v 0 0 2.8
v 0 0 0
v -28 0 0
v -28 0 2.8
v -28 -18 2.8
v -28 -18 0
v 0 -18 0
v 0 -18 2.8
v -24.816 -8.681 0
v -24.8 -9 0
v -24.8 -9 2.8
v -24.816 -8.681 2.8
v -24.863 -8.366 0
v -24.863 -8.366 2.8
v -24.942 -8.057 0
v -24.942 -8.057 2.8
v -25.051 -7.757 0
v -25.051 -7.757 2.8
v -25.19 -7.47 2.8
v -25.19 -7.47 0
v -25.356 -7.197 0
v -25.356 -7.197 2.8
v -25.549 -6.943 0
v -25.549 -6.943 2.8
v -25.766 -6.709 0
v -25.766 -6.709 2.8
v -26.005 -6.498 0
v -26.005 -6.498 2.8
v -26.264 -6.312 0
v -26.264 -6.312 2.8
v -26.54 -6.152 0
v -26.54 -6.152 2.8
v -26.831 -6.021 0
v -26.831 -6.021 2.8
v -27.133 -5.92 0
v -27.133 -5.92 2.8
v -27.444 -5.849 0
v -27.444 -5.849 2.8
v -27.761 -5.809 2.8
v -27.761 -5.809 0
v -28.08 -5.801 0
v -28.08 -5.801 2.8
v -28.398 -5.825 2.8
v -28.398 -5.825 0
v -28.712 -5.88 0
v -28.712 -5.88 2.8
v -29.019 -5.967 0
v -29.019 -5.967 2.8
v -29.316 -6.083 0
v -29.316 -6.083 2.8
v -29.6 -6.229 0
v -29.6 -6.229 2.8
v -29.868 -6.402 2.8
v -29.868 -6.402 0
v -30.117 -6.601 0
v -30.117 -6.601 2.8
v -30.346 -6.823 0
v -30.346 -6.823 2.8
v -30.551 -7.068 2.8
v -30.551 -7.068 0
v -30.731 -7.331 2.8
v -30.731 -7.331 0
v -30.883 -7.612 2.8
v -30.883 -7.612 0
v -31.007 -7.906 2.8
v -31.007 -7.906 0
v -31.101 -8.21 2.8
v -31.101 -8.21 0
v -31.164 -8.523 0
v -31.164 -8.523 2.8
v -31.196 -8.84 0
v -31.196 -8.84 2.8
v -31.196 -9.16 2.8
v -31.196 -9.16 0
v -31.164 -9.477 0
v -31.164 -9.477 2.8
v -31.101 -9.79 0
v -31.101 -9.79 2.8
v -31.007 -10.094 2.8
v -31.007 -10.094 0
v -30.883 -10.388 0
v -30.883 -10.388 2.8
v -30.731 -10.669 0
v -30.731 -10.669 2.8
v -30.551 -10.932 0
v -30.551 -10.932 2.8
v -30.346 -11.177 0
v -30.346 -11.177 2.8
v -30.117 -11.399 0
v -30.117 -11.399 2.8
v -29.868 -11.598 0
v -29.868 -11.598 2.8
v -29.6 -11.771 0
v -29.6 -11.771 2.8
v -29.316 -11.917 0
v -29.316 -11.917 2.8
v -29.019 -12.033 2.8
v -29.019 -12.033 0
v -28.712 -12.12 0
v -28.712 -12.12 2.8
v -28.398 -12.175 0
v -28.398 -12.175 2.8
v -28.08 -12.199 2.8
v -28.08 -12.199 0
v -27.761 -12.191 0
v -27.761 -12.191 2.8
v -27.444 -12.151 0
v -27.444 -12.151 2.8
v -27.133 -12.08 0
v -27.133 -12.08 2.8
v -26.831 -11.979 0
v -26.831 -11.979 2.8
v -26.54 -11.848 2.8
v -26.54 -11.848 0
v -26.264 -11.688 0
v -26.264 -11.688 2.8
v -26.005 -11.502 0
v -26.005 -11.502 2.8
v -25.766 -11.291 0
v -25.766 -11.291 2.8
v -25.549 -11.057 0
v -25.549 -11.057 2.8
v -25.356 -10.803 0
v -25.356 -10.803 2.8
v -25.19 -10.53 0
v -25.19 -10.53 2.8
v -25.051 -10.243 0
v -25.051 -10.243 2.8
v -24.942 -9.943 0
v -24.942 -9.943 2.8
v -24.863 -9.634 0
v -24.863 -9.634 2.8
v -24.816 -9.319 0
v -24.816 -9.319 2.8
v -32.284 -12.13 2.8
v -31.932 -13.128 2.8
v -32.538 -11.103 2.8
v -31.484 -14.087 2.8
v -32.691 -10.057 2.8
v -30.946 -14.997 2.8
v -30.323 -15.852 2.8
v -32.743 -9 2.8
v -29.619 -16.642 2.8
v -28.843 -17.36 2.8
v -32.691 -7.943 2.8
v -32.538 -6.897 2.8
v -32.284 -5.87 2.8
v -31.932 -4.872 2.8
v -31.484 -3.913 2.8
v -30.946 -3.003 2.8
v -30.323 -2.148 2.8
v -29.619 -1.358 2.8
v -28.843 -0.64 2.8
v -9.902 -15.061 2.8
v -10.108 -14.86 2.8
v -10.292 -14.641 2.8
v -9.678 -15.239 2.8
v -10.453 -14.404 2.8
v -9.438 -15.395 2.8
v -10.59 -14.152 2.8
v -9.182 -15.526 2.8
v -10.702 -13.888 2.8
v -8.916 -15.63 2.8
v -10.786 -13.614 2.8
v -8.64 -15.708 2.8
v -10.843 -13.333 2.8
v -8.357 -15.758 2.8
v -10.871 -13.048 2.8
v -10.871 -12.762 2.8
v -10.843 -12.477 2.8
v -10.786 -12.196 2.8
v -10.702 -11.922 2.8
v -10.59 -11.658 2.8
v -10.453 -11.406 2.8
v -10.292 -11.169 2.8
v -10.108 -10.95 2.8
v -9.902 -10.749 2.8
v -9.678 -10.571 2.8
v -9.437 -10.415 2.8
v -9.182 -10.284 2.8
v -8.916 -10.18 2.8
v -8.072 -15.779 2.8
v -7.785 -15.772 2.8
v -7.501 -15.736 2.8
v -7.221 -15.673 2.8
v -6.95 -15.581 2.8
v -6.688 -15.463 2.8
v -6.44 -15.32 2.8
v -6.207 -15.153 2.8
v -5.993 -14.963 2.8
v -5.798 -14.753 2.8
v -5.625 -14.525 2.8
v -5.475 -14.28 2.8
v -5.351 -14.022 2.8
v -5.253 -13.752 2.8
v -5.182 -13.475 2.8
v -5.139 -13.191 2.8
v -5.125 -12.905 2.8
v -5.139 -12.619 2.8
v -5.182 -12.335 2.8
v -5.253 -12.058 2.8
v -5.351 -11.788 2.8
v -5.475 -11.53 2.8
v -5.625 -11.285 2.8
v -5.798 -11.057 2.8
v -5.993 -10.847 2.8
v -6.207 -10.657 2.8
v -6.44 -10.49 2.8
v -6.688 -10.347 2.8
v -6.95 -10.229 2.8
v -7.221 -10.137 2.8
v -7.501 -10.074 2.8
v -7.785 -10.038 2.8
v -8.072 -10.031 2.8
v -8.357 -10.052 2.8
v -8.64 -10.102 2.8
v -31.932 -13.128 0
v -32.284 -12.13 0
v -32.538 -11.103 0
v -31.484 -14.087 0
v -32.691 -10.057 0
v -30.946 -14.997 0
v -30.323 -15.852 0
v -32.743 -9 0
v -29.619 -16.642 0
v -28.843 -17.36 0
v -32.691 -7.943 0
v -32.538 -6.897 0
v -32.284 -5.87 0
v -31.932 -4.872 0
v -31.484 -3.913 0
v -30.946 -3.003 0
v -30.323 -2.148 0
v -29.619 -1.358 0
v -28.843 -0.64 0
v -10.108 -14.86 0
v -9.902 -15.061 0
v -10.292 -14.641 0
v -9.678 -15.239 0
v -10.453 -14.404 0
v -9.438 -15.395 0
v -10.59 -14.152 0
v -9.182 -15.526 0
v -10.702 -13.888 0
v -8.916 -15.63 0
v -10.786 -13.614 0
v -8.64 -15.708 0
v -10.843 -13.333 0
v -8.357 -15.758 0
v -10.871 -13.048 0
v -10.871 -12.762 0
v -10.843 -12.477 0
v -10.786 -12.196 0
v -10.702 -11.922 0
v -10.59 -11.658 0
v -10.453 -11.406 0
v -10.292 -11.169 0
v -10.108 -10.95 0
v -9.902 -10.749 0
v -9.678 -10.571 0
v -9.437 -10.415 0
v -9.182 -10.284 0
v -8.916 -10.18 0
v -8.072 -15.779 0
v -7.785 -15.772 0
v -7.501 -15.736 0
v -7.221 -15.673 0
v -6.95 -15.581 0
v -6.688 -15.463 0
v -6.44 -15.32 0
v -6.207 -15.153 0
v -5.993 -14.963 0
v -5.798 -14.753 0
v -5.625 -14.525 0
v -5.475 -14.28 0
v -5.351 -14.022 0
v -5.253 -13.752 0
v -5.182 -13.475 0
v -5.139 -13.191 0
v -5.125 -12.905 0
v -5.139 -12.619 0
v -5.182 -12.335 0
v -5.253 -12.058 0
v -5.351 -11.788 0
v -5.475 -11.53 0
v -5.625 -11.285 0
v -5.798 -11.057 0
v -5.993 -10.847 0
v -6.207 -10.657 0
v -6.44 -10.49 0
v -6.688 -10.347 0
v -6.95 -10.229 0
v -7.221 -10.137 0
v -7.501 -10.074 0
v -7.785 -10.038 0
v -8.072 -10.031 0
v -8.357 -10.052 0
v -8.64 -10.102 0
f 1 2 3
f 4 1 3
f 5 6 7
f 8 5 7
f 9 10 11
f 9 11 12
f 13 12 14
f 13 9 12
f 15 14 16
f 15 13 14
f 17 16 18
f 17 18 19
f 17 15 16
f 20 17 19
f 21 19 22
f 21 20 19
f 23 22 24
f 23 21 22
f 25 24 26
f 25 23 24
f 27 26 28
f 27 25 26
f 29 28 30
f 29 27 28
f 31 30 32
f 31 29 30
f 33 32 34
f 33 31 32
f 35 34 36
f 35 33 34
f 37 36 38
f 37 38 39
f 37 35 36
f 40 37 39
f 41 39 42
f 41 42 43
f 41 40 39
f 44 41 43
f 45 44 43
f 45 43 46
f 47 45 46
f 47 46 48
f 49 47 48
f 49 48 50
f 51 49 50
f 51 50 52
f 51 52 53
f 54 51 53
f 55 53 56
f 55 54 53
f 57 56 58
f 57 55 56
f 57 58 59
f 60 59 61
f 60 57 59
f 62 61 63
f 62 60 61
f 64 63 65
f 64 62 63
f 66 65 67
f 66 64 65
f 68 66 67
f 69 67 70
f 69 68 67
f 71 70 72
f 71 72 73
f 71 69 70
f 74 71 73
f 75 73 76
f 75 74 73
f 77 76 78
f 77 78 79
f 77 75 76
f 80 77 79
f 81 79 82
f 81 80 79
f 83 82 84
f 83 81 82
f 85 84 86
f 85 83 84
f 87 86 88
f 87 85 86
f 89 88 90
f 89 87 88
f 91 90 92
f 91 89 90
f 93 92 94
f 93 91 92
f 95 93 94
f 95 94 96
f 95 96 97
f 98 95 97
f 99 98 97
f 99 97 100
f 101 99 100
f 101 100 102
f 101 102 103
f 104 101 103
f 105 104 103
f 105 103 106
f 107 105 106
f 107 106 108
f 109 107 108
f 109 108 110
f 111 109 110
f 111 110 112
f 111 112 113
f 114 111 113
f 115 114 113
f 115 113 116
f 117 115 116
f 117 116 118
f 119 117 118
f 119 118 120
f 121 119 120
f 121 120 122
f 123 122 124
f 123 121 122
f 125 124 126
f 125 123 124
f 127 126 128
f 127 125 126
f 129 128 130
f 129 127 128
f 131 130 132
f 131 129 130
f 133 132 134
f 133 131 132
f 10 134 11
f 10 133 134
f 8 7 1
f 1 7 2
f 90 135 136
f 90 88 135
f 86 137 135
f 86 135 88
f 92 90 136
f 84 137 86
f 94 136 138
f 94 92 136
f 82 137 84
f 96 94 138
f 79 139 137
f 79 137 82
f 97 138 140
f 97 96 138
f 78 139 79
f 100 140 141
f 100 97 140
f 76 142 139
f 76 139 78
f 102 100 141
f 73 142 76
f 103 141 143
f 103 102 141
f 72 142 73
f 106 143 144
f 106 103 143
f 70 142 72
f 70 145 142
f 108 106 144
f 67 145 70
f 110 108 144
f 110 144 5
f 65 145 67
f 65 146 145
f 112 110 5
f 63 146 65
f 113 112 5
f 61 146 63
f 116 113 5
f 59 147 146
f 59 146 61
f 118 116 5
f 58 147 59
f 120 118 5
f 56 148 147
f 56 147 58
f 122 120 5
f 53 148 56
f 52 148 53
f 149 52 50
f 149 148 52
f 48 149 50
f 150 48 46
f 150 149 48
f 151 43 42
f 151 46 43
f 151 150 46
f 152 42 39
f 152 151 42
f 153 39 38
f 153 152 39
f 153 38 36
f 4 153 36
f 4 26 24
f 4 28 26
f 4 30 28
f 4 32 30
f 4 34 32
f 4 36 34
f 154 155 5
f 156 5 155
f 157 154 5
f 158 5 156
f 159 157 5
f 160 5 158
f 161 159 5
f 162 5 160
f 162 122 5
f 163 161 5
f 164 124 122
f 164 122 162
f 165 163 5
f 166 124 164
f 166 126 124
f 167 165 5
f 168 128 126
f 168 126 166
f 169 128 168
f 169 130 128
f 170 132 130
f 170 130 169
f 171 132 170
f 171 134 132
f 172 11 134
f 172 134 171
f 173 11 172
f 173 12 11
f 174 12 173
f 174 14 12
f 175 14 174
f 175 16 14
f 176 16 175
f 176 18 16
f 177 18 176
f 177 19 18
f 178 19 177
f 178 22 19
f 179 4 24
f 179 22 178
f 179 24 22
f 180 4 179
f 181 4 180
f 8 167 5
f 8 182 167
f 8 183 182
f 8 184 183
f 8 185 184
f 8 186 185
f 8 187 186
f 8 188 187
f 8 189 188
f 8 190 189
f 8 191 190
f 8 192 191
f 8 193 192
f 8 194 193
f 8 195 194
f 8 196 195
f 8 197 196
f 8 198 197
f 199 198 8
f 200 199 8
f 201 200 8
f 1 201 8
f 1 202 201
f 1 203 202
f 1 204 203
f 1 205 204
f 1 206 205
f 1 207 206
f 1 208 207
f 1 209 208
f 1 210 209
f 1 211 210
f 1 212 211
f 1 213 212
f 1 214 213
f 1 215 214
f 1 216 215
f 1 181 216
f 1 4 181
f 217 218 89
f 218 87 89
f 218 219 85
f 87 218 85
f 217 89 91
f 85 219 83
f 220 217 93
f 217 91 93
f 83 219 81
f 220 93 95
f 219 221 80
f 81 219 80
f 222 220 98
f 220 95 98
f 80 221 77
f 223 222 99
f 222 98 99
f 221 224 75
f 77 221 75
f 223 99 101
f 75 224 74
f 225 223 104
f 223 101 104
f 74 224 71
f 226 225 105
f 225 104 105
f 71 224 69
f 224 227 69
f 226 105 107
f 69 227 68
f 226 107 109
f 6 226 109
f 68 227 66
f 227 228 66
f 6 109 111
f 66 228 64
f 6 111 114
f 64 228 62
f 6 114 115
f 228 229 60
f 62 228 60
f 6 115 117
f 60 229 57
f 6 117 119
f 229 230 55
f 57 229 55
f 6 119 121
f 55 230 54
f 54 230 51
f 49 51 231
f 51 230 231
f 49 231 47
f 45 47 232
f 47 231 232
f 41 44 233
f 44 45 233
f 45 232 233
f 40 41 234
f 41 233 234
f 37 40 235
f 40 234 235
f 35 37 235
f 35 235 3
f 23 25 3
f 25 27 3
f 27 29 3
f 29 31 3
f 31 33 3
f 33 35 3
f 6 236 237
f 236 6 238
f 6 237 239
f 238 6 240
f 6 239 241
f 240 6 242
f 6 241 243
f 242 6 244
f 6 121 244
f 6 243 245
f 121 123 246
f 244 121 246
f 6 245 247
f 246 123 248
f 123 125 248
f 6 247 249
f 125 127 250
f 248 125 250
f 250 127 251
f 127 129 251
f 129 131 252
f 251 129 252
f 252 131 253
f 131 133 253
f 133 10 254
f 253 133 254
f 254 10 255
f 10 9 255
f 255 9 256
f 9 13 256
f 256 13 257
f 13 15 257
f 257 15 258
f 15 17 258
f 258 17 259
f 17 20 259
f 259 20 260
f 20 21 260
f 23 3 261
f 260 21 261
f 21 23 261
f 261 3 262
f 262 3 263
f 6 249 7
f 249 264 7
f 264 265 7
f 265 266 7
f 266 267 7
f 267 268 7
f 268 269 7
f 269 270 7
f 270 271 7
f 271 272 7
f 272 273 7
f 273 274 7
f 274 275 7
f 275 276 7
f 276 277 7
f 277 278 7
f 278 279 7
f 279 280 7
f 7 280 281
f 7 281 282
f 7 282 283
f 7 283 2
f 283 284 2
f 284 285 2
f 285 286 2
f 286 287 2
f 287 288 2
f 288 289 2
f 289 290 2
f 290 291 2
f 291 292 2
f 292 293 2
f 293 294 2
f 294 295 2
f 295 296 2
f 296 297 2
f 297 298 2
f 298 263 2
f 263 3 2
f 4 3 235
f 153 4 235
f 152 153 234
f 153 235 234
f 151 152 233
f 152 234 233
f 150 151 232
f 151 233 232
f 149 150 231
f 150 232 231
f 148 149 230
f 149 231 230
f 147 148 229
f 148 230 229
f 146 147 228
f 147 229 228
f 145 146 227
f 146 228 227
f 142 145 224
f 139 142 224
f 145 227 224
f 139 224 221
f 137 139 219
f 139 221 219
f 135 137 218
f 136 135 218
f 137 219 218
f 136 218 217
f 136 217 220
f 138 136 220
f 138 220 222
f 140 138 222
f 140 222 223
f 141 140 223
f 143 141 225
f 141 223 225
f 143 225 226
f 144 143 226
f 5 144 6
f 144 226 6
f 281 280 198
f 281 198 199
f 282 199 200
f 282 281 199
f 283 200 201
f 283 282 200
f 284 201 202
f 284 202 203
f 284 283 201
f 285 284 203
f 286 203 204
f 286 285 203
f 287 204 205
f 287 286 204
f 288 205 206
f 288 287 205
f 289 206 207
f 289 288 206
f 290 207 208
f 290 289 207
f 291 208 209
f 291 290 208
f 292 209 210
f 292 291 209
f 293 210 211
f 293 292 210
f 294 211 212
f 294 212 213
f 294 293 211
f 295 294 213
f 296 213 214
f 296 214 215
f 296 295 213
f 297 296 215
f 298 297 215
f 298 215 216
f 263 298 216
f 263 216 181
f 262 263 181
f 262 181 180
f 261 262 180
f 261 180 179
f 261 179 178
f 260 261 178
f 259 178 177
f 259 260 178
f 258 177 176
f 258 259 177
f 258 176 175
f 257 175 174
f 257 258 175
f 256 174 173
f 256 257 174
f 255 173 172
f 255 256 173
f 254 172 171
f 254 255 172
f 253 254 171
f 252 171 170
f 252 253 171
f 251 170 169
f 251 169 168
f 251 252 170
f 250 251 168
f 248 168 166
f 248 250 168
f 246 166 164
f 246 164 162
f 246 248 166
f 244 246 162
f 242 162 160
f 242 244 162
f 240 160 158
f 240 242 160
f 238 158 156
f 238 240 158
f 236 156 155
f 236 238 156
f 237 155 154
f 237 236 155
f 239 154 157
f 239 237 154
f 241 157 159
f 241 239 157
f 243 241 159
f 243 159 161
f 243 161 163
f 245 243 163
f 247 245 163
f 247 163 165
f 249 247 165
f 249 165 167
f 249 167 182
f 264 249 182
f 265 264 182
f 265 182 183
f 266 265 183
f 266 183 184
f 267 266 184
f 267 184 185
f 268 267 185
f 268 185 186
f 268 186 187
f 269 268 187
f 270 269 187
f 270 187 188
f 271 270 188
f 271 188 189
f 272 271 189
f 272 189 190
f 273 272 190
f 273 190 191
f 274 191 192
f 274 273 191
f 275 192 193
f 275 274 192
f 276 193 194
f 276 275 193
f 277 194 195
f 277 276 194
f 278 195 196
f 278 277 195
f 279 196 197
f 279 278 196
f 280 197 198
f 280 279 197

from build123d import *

# Parameters (mm, degrees)
F0_R     = 2.875
F0_R_2   = 3.2
F1_DEPTH = 2.8


with BuildPart() as f1:
    # F0 (on Top) → F1 (new body)
    with BuildSketch(Plane.XY):
        with BuildLine():
            Line((0, -18), (0, 0))
            Line((0, 0), (-28, 0))
            ThreePointArc((-28, 0), (-32.742648, -9), (-28, -18))
            Line((-28, -18), (0, -18))
        make_face()
        with Locations((-8, -12.905)):
            Circle(F0_R, mode=Mode.SUBTRACT)
        with Locations((-28, -9)):
            Circle(F0_R_2, mode=Mode.SUBTRACT)
    extrude(amount=F1_DEPTH)


solid = f1.part
